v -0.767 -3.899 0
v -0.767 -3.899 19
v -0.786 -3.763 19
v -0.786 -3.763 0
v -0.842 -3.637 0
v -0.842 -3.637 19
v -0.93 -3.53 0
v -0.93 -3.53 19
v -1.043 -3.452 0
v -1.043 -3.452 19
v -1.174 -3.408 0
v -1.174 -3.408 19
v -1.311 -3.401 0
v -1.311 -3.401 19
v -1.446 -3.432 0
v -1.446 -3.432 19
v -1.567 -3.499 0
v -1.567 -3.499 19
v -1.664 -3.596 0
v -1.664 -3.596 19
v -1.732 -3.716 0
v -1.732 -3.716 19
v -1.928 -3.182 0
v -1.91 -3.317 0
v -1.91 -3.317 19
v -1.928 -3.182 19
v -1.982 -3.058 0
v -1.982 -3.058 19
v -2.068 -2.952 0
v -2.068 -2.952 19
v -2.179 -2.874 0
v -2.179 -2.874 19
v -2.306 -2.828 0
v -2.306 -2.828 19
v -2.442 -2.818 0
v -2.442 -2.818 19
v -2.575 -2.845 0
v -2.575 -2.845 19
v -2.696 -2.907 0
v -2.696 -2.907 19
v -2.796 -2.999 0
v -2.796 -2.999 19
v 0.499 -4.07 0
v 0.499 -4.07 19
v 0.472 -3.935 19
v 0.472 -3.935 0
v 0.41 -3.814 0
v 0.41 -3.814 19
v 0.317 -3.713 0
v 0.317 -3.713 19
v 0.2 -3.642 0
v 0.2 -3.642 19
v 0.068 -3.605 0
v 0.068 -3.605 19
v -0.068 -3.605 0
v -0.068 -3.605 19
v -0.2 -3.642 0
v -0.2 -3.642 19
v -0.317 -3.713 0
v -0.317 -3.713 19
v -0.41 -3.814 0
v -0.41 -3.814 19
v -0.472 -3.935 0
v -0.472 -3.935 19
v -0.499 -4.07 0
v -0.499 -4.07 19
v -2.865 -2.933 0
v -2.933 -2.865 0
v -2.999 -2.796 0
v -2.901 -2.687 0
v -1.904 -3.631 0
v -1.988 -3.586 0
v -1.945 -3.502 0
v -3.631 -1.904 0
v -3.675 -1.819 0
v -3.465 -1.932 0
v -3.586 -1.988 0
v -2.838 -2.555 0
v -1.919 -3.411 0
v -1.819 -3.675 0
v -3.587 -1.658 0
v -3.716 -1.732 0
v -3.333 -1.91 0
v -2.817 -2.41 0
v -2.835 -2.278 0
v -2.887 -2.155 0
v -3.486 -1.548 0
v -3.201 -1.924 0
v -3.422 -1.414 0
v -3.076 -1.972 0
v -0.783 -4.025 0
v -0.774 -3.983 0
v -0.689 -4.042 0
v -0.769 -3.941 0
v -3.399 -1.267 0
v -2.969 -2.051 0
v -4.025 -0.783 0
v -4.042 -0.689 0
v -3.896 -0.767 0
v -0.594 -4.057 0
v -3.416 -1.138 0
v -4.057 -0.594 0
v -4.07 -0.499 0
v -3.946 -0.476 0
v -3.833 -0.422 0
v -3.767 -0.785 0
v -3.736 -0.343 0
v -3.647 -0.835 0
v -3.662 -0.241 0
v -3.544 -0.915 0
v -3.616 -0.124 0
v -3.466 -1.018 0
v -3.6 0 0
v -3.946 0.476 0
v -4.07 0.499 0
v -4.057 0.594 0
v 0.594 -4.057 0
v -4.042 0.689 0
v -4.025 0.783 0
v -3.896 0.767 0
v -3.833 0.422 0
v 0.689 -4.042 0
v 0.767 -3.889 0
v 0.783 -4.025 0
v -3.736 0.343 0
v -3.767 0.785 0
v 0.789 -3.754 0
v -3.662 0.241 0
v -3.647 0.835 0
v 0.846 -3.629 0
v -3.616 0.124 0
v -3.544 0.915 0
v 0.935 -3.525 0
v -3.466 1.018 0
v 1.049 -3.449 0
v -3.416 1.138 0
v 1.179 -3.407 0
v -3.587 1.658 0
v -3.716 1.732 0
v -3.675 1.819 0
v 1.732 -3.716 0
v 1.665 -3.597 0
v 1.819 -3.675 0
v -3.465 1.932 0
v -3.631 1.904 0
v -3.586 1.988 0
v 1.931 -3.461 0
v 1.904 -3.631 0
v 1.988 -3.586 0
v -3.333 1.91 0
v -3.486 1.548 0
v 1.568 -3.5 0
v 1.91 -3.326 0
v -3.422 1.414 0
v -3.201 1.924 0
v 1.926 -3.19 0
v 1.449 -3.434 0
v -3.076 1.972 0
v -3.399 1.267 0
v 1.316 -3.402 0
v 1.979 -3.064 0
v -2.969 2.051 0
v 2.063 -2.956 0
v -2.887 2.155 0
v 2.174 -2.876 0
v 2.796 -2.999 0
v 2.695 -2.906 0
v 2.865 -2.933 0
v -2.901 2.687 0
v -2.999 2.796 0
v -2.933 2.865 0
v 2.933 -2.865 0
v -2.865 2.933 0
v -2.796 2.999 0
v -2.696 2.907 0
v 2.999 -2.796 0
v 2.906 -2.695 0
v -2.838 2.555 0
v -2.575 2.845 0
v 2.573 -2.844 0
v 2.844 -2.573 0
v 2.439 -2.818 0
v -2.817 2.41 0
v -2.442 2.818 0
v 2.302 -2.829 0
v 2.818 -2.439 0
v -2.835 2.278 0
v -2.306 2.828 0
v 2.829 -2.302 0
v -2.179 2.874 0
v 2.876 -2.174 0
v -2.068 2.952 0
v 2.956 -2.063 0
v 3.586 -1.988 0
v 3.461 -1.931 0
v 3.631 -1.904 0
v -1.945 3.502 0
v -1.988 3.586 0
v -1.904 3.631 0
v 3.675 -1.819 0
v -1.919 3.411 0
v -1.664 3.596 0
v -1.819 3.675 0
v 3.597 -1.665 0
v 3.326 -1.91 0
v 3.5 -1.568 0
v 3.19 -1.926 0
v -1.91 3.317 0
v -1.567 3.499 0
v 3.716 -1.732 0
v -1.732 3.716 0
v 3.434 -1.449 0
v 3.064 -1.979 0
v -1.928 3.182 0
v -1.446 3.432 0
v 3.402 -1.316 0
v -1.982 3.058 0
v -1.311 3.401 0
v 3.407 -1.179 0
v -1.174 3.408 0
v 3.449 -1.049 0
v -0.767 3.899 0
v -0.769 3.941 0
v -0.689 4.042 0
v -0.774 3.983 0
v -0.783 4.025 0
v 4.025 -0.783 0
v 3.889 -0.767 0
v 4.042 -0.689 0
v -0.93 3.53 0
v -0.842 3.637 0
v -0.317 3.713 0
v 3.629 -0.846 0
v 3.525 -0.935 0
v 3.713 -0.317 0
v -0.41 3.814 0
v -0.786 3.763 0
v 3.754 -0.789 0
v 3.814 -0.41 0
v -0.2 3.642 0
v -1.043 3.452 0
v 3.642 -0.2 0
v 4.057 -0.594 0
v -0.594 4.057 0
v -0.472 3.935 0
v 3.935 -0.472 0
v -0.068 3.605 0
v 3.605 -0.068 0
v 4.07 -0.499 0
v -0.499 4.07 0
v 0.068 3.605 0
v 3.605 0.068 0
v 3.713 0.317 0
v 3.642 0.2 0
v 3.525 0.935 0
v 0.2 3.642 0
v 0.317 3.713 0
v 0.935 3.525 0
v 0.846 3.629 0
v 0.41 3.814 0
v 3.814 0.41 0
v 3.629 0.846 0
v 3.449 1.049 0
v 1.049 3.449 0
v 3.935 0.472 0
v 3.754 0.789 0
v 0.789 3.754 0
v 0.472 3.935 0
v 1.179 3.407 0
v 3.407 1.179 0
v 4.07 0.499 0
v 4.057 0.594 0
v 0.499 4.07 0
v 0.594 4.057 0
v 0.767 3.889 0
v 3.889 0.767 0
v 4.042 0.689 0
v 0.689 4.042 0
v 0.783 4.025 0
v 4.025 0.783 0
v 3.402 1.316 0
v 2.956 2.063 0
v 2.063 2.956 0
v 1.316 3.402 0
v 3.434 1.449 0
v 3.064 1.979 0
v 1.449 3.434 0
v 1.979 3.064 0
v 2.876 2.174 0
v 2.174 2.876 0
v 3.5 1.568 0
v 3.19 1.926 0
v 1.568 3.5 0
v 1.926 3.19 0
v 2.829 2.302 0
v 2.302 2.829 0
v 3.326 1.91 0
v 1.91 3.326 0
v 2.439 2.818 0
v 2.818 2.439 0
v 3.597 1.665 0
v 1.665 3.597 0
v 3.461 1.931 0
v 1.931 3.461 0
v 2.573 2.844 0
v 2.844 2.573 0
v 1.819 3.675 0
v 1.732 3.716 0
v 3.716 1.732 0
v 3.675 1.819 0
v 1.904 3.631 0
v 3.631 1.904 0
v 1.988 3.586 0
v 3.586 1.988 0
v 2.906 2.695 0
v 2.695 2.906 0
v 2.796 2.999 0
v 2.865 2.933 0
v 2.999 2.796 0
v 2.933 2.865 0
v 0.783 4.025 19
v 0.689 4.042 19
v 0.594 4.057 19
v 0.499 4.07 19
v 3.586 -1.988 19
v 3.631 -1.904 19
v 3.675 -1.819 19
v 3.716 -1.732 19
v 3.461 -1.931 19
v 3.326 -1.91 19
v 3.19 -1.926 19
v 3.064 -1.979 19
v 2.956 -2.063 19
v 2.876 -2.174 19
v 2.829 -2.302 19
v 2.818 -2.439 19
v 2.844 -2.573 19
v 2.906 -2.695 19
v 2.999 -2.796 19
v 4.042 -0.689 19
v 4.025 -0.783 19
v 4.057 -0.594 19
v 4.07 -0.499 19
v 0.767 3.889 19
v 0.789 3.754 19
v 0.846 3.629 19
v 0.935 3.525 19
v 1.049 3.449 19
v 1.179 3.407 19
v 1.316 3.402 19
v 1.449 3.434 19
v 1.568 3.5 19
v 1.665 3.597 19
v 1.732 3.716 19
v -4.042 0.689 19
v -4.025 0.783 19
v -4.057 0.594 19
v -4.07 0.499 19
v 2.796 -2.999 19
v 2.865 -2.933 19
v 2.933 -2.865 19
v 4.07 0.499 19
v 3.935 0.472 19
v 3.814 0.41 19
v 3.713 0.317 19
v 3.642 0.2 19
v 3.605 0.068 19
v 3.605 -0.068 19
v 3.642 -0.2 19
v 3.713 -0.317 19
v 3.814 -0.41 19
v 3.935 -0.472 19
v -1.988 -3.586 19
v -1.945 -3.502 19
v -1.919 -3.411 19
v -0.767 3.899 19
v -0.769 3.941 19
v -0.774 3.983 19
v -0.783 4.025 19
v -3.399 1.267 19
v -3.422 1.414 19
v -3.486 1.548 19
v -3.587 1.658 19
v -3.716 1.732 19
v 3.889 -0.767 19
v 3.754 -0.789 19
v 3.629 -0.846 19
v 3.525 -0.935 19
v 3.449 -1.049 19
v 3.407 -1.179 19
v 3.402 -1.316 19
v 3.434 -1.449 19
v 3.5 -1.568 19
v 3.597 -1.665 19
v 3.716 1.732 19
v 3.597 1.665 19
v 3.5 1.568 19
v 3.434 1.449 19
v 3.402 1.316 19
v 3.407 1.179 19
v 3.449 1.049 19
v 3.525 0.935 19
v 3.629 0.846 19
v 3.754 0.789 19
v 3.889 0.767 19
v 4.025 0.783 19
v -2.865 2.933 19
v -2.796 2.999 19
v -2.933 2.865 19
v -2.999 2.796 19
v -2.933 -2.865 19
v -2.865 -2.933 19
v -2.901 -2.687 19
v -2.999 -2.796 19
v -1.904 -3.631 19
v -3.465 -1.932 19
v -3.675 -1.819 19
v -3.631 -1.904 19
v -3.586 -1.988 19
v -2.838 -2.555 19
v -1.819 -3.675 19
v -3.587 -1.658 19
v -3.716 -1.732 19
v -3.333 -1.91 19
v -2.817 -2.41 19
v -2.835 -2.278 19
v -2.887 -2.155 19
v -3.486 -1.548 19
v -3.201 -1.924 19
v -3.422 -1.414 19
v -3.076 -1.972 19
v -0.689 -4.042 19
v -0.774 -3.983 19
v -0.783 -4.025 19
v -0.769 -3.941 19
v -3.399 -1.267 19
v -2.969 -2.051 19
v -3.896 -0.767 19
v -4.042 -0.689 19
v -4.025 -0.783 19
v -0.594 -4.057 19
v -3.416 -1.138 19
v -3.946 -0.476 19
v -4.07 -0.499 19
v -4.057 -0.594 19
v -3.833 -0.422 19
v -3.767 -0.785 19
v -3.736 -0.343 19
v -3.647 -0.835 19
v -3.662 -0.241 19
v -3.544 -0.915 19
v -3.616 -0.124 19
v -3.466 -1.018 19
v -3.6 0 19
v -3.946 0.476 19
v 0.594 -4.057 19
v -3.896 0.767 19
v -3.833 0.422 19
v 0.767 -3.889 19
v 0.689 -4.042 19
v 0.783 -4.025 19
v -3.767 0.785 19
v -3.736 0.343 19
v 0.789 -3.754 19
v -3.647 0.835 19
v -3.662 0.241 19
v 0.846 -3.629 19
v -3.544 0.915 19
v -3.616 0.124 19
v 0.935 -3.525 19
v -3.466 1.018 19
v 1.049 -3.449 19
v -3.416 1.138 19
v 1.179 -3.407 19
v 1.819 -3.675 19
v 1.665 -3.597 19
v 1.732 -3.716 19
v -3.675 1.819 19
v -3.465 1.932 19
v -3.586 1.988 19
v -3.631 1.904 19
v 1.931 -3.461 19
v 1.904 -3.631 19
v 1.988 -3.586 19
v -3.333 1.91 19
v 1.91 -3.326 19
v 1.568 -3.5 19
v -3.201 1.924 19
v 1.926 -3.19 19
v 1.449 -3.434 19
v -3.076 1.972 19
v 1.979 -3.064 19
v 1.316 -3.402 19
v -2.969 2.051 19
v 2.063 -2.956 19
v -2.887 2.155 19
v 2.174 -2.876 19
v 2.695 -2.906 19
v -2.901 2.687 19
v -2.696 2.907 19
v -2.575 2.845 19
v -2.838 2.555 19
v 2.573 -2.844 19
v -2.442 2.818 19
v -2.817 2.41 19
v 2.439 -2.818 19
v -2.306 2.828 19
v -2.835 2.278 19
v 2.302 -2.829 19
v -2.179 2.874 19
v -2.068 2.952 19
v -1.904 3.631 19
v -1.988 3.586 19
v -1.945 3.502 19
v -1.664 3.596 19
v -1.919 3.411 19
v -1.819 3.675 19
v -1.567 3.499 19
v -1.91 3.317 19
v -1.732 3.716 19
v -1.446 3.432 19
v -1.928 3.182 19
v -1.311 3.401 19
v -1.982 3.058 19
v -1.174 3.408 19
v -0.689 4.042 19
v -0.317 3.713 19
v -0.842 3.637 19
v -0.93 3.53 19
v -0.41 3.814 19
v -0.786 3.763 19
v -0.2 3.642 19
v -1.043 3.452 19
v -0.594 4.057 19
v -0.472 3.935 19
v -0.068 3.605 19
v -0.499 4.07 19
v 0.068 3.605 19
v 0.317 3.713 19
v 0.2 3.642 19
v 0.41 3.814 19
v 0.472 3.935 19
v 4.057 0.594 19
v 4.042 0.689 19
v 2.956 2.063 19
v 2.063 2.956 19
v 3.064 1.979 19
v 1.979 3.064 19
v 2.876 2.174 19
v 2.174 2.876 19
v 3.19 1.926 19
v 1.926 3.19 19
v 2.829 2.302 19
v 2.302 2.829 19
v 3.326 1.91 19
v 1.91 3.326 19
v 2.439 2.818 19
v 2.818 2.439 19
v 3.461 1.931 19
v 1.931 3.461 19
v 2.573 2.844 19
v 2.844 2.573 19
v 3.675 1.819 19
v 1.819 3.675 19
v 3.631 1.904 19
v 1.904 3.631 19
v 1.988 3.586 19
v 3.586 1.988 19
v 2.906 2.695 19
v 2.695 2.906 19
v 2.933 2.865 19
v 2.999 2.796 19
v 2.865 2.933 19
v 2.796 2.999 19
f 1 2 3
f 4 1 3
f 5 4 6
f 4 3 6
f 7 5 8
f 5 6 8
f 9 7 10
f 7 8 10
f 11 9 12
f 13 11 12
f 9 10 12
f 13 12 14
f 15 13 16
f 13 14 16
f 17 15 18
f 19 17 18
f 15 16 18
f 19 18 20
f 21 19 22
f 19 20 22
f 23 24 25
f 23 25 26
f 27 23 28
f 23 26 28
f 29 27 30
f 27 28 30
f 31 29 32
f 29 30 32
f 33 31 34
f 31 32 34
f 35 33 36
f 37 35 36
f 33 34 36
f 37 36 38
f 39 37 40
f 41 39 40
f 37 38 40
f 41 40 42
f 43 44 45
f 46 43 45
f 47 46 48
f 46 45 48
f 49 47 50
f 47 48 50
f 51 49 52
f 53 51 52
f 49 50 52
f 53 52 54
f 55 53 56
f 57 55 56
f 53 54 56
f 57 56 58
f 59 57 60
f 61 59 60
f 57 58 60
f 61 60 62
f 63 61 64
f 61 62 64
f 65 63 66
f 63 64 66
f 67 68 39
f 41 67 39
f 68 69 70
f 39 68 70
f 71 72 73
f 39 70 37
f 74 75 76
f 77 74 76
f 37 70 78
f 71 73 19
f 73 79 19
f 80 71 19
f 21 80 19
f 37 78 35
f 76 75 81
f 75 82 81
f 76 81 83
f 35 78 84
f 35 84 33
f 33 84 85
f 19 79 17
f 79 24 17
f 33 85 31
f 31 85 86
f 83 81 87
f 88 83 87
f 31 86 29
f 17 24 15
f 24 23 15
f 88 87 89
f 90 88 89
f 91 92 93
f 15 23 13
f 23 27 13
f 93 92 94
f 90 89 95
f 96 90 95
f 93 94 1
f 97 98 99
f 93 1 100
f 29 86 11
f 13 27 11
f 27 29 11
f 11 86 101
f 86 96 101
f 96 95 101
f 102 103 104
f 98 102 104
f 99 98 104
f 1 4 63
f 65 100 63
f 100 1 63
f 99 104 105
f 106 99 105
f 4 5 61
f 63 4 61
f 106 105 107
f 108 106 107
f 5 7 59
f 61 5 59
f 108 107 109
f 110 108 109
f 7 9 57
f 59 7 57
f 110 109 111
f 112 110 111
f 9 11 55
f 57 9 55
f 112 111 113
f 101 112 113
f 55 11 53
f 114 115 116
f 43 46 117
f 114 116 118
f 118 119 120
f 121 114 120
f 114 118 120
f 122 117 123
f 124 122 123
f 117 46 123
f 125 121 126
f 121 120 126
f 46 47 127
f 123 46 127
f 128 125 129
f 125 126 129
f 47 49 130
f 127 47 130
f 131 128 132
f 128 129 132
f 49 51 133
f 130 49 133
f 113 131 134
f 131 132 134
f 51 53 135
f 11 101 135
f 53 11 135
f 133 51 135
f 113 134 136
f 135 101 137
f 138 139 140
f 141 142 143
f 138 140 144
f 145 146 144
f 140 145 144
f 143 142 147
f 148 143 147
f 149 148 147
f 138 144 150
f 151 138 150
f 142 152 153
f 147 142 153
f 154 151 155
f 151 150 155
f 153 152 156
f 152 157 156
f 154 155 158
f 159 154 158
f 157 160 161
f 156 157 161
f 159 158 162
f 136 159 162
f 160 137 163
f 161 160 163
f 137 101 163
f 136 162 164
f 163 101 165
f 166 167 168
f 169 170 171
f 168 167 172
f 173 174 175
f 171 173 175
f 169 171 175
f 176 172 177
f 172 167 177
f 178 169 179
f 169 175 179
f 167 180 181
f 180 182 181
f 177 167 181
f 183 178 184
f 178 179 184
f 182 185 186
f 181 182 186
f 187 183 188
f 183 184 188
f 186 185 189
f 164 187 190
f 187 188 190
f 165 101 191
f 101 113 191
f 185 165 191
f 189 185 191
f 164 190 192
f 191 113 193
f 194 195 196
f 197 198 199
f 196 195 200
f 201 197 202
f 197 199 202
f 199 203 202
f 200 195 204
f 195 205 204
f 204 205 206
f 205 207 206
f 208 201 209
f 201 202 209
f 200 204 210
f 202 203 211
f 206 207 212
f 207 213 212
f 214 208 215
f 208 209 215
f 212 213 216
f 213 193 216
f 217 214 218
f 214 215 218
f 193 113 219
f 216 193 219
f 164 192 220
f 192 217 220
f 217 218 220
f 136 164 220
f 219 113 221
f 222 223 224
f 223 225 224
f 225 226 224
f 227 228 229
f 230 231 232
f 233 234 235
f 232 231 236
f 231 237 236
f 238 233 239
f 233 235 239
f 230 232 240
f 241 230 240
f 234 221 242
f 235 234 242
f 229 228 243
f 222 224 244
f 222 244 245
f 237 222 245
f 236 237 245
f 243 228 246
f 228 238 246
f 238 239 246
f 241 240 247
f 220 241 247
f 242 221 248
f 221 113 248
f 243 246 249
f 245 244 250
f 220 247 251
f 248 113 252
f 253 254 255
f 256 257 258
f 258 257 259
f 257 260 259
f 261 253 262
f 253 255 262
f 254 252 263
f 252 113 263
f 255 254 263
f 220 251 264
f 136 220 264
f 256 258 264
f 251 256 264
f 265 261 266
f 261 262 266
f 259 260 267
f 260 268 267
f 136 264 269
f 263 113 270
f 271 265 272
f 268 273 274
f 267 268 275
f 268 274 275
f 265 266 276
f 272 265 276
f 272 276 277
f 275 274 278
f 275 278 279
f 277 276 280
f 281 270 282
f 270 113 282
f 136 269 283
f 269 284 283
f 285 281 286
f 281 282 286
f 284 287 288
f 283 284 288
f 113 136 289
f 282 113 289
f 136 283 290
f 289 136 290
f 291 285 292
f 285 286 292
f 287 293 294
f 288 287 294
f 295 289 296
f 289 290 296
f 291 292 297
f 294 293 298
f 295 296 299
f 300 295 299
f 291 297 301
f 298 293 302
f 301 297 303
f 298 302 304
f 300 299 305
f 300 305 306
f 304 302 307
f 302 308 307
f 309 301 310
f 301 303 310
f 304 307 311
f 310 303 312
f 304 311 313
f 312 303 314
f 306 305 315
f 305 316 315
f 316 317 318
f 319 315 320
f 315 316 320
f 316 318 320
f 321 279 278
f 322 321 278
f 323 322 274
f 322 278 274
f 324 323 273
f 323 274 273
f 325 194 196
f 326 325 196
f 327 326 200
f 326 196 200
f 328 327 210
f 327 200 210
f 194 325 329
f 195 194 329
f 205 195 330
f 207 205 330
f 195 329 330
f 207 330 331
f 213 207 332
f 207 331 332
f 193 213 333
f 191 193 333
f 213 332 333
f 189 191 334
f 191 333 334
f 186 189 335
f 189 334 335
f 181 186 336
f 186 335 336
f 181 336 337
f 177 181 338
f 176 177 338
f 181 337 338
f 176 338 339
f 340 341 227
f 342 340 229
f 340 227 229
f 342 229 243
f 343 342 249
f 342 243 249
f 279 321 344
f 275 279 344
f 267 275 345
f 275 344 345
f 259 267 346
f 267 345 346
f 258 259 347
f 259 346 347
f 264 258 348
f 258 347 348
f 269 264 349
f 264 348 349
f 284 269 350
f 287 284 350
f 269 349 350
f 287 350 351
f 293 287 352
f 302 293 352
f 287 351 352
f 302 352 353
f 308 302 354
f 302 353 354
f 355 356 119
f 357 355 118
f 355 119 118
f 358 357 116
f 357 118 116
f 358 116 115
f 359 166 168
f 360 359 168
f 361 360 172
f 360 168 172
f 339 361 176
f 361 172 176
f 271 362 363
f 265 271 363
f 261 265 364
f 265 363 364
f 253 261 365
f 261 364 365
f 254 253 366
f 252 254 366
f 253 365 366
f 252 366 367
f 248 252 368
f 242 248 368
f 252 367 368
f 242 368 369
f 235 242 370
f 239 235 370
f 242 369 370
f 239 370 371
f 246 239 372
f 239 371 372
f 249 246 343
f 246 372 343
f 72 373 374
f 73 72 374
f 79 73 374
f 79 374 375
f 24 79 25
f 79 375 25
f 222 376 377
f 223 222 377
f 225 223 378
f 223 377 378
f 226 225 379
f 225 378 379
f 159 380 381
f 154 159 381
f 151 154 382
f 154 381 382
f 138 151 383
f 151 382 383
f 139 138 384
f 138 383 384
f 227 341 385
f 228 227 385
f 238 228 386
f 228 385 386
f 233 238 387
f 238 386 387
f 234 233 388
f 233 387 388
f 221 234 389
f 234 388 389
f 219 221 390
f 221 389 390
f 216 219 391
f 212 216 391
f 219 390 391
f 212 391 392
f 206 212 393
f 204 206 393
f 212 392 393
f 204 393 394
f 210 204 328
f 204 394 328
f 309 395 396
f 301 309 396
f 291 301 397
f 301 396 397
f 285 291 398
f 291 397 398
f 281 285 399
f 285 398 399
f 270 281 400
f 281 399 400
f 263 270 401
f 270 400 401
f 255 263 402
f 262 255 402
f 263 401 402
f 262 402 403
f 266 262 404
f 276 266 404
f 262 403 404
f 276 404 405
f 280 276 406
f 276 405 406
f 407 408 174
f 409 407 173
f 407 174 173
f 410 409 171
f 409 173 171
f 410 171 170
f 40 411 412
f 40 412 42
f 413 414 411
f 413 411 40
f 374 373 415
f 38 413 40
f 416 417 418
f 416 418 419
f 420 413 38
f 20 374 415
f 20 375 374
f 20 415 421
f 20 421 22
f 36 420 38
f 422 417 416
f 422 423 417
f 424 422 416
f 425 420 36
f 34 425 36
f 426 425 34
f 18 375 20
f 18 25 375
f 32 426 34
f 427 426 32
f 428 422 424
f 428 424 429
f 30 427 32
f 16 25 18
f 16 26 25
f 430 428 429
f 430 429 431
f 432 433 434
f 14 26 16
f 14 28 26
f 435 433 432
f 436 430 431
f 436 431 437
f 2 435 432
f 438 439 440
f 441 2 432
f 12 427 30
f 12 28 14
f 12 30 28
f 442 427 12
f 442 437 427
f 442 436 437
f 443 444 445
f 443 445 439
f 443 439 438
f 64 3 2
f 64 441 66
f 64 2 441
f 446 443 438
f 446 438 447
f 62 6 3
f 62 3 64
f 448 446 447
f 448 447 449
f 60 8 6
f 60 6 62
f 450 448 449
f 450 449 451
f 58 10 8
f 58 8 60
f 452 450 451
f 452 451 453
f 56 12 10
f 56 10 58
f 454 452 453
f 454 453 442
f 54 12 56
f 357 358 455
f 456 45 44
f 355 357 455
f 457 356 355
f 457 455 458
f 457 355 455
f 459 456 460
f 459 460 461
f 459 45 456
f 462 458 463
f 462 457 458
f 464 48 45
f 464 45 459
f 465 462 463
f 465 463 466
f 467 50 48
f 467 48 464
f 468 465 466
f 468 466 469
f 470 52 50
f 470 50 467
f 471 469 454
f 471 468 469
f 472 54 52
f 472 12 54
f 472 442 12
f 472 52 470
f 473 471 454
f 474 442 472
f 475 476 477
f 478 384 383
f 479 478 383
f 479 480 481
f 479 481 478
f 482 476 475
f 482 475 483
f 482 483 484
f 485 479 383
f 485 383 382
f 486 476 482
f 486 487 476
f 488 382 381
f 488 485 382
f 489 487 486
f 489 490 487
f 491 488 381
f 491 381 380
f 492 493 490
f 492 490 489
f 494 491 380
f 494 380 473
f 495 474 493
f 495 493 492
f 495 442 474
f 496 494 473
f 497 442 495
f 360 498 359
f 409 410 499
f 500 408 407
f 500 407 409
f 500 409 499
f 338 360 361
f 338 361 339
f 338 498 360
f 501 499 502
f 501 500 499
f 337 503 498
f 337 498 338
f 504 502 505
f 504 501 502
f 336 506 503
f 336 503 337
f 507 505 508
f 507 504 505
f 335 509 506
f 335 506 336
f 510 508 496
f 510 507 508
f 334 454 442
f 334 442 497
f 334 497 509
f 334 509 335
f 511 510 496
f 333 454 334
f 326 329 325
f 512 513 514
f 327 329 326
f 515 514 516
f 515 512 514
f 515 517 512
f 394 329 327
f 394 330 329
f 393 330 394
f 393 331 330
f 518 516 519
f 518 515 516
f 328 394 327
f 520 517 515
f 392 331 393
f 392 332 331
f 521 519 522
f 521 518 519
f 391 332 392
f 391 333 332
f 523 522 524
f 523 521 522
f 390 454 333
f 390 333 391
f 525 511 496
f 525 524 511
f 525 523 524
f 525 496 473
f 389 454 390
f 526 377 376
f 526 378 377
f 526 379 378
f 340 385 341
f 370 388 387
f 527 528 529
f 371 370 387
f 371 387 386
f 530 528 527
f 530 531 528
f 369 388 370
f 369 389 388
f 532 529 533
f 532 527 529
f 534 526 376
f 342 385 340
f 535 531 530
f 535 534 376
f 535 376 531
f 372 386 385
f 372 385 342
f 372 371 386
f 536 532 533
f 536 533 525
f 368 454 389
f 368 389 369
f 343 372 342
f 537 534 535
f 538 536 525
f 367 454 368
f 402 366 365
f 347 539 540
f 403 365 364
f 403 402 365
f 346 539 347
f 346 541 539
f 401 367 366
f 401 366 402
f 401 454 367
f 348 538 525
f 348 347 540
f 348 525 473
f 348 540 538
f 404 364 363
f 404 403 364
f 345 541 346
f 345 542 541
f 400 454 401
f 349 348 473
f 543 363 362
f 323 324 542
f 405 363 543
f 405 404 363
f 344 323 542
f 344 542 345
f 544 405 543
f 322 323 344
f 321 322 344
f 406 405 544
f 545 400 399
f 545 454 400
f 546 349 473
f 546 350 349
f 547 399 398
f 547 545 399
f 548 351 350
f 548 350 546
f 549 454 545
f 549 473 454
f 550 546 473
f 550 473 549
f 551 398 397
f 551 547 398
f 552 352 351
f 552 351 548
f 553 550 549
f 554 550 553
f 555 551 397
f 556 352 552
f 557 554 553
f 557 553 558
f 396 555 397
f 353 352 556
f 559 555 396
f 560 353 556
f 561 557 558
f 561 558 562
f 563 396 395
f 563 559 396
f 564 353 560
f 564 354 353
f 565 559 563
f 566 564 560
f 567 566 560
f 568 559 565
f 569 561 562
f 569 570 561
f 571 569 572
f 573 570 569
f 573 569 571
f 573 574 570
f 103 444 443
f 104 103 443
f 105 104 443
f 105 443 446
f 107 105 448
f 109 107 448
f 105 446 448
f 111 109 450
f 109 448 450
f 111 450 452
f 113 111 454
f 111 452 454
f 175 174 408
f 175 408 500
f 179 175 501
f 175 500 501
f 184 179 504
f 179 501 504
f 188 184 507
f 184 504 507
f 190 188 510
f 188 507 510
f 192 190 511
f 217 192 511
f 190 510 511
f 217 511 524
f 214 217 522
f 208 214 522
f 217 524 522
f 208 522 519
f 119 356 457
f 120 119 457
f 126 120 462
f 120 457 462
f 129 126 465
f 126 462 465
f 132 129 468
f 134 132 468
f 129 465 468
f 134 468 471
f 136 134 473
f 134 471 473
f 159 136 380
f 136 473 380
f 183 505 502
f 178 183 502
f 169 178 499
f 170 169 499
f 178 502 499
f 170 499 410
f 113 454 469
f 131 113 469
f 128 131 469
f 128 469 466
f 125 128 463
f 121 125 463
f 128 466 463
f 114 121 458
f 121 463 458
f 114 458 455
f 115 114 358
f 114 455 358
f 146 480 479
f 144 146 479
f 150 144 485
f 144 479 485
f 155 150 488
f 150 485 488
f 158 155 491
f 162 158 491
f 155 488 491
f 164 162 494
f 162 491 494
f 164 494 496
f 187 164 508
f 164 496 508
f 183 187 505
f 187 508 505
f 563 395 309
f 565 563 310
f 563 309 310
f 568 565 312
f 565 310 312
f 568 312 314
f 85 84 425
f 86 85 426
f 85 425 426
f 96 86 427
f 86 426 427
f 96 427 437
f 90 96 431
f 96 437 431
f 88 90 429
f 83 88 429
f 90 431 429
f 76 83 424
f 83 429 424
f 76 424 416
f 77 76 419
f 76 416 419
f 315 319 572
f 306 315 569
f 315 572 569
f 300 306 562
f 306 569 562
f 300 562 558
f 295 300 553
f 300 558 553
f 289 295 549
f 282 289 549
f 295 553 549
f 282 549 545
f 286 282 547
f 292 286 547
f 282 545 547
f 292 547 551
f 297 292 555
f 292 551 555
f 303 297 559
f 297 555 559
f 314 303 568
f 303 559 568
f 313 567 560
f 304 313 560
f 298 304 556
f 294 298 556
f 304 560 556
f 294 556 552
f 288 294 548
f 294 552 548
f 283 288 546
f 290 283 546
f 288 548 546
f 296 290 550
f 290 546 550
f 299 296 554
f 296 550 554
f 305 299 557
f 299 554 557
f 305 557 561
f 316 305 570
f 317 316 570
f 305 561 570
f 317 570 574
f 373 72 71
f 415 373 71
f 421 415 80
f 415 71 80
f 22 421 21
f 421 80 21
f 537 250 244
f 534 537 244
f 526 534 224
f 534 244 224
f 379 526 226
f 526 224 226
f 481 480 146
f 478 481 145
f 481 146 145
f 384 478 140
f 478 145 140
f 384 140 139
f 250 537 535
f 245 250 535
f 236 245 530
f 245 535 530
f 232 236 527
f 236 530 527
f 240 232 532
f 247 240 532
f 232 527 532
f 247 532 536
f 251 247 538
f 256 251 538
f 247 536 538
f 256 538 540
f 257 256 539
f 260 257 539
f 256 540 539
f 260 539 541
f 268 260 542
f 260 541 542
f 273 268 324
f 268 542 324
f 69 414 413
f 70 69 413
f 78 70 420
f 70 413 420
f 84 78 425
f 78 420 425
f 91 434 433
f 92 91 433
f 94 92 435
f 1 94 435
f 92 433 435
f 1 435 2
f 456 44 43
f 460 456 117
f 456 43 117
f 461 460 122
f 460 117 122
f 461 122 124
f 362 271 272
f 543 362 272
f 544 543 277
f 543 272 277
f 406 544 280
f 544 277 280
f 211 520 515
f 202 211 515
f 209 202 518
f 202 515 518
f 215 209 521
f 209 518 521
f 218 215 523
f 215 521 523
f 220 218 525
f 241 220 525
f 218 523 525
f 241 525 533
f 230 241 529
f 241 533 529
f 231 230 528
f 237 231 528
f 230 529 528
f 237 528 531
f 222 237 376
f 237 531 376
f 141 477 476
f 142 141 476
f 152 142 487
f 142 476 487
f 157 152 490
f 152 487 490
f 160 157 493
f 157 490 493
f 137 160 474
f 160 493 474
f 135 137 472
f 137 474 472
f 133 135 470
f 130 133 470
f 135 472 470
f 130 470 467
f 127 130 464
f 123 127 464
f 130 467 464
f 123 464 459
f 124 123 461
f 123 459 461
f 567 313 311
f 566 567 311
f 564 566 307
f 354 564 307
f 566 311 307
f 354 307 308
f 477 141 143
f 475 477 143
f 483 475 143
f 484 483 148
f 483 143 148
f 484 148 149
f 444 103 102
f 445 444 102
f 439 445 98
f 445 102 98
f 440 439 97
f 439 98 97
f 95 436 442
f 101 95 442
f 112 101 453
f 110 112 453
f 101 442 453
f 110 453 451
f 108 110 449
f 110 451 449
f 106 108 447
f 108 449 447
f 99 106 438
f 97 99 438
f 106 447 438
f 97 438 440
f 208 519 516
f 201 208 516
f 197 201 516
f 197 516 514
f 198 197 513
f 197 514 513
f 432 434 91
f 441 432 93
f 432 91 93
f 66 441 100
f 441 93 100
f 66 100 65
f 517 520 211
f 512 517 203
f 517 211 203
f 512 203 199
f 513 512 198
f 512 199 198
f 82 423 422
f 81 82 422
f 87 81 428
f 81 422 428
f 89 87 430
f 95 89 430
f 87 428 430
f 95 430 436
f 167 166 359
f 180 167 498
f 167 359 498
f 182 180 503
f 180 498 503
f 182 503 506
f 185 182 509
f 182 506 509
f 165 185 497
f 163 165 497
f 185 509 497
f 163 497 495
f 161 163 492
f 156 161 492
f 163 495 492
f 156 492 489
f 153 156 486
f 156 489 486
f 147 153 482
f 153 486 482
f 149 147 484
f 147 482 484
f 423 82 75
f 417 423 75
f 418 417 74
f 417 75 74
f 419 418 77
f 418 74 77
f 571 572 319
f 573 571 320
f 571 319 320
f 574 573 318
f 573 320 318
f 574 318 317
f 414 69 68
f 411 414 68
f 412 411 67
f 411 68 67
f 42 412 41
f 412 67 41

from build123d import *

# Parameters (mm, degrees)
F0_R     = 4.1
F0_R_2   = 3
F1_DEPTH = 19
F3_DEPTH = 25


with BuildPart() as f1:
    # F0 (on Top) → F1 (new body)
    with BuildSketch(Plane.XY):
        Circle(F0_R)
        Circle(F0_R_2, mode=Mode.SUBTRACT)
        Circle(F0_R_2)
    extrude(amount=F1_DEPTH)

    # F2 (on face) → F3 (cut)
    with BuildSketch(Plane.XY.offset(19)):
        with BuildLine():
            ThreePointArc((0.4990696282, 4.0695121951), (0.4997673529, 4.0847490014), (0.5, 4.1))
            ThreePointArc((0.5, 4.1), (-0.0152509986, 4.5997673529), (-0.4990696282, 4.0695121951))
            ThreePointArc((-0.4990696282, 4.0695121951), (0, 4.1), (0.4990696282, 4.0695121951))
        make_face()
        with BuildLine():
            ThreePointArc((0.4990696282, 4.0695121951), (0, 4.1), (-0.4990696282, 4.0695121951))
            ThreePointArc((-0.4990696282, 4.0695121951), (0, 3.6), (0.4990696282, 4.0695121951))
        make_face()
        with BuildLine():
            ThreePointArc((-1.7321918491, 3.7161150948), (-1.2669696769, 3.8993317168), (-0.7829050052, 4.0245570878))
            ThreePointArc((-0.7829050052, 4.0245570878), (-1.4214781741, 4.374859975), (-1.7321918491, 3.7161150948))
        make_face()
        with BuildLine():
            ThreePointArc((-0.7669696769, 3.8993317168), (-0.7709695076, 3.9624493218), (-0.7829050052, 4.0245570878))
            ThreePointArc((-0.7829050052, 4.0245570878), (-1.2669696769, 3.8993317168), (-1.7321918491, 3.7161150948))
            ThreePointArc((-1.7321918491, 3.7161150948), (-1.1737256049, 3.4081031111), (-0.7669696769, 3.8993317168))
        make_face()
        with BuildLine():
            ThreePointArc((1.7321918491, 3.7161150948), (1.2669696769, 3.8993317168), (0.7829050052, 4.0245570878))
            ThreePointArc((0.7829050052, 4.0245570878), (1.1124611797, 3.4238034587), (1.7321918491, 3.7161150948))
        make_face()
        with BuildLine():
            ThreePointArc((-2.7957550629, 2.9989587574), (-2.4099195344, 3.3169696769), (-1.9882434418, 3.585650292))
            ThreePointArc((-1.9882434418, 3.585650292), (-2.7038121605, 3.7214781741), (-2.7957550629, 2.9989587574))
        make_face()
        with BuildLine():
            ThreePointArc((-1.9099195344, 3.3169696769), (-1.929899719, 3.4569017206), (-1.9882434418, 3.585650292))
            ThreePointArc((-1.9882434418, 3.585650292), (-2.4099195344, 3.3169696769), (-2.7957550629, 2.9989587574))
            ThreePointArc((-2.7957550629, 2.9989587574), (-2.2409783675, 2.8463754971), (-1.9099195344, 3.3169696769))
        make_face()
        with BuildLine():
            ThreePointArc((2.7957550629, 2.9989587574), (2.4099195344, 3.3169696769), (1.9882434418, 3.585650292))
            ThreePointArc((1.9882434418, 3.585650292), (2.1160269083, 2.9124611797), (2.7957550629, 2.9989587574))
        make_face()
        with BuildLine():
            ThreePointArc((-3.585650292, 1.9882434418), (-3.3169696769, 2.4099195344), (-2.9989587574, 2.7957550629))
            ThreePointArc((-2.9989587574, 2.7957550629), (-3.7214781741, 2.7038121605), (-3.585650292, 1.9882434418))
        make_face()
        with BuildLine():
            ThreePointArc((-2.8169696769, 2.4099195344), (-2.8647498964, 2.6232204254), (-2.9989587574, 2.7957550629))
            ThreePointArc((-2.9989587574, 2.7957550629), (-3.3169696769, 2.4099195344), (-3.585650292, 1.9882434418))
            ThreePointArc((-3.585650292, 1.9882434418), (-3.0764913073, 1.9715473709), (-2.8169696769, 2.4099195344))
        make_face()
        with BuildLine():
            ThreePointArc((3.585650292, 1.9882434418), (3.3169696769, 2.4099195344), (2.9989587574, 2.7957550629))
            ThreePointArc((2.9989587574, 2.7957550629), (2.9124611797, 2.1160269083), (3.585650292, 1.9882434418))
        make_face()
        with BuildLine():
            ThreePointArc((-4.0245570878, 0.7829050052), (-3.8993317168, 1.2669696769), (-3.7161150948, 1.7321918491))
            ThreePointArc((-3.7161150948, 1.7321918491), (-4.374859975, 1.4214781741), (-4.0245570878, 0.7829050052))
        make_face()
        with BuildLine():
            ThreePointArc((-3.3993317168, 1.2669696769), (-3.486047123, 1.5483872395), (-3.7161150948, 1.7321918491))
            ThreePointArc((-3.7161150948, 1.7321918491), (-3.8993317168, 1.2669696769), (-4.0245570878, 0.7829050052))
            ThreePointArc((-4.0245570878, 0.7829050052), (-3.5932375201, 0.8716137073), (-3.3993317168, 1.2669696769))
        make_face()
        with BuildLine():
            ThreePointArc((4.0245570878, 0.7829050052), (3.8993317168, 1.2669696769), (3.7161150948, 1.7321918491))
            ThreePointArc((3.7161150948, 1.7321918491), (3.4238034587, 1.1124611797), (4.0245570878, 0.7829050052))
        make_face()
        with BuildLine():
            ThreePointArc((-4.0695121951, -0.4990696282), (-4.1, 0), (-4.0695121951, 0.4990696282))
            ThreePointArc((-4.0695121951, 0.4990696282), (-4.6, 0), (-4.0695121951, -0.4990696282))
        make_face()
        with BuildLine():
            ThreePointArc((-3.6, 0), (-3.7358270312, 0.3426047997), (-4.0695121951, 0.4990696282))
            ThreePointArc((-4.0695121951, 0.4990696282), (-4.1, 0), (-4.0695121951, -0.4990696282))
            ThreePointArc((-4.0695121951, -0.4990696282), (-3.7358270312, -0.3426047997), (-3.6, 0))
        make_face()
        with BuildLine():
            ThreePointArc((4.1, 0), (4.0923709509, 0.25), (4.0695121951, 0.4990696282))
            ThreePointArc((4.0695121951, 0.4990696282), (3.6, 0), (4.0695121951, -0.4990696282))
            ThreePointArc((4.0695121951, -0.4990696282), (4.0923709509, -0.25), (4.1, 0))
        make_face()
        with BuildLine():
            ThreePointArc((4.6, 0), (4.4426047997, 0.3641729688), (4.0695121951, 0.4990696282))
            ThreePointArc((4.0695121951, 0.4990696282), (4.0923709509, 0.25), (4.1, 0))
            ThreePointArc((4.1, 0), (4.0923709509, -0.25), (4.0695121951, -0.4990696282))
            ThreePointArc((4.0695121951, -0.4990696282), (4.4426047997, -0.3641729688), (4.6, 0))
        make_face()
        with BuildLine():
            ThreePointArc((-3.7161150948, -1.7321918491), (-3.8993317168, -1.2669696769), (-4.0245570878, -0.7829050052))
            ThreePointArc((-4.0245570878, -0.7829050052), (-4.374859975, -1.4214781741), (-3.7161150948, -1.7321918491))
        make_face()
        with BuildLine():
            ThreePointArc((-3.3993317168, -1.2669696769), (-3.5932375201, -0.8716137073), (-4.0245570878, -0.7829050052))
            ThreePointArc((-4.0245570878, -0.7829050052), (-3.8993317168, -1.2669696769), (-3.7161150948, -1.7321918491))
            ThreePointArc((-3.7161150948, -1.7321918491), (-3.486047123, -1.5483872395), (-3.3993317168, -1.2669696769))
        make_face()
        with BuildLine():
            ThreePointArc((3.7161150948, -1.7321918491), (3.8993317168, -1.2669696769), (4.0245570878, -0.7829050052))
            ThreePointArc((4.0245570878, -0.7829050052), (3.4238034587, -1.1124611797), (3.7161150948, -1.7321918491))
        make_face()
        with BuildLine():
            ThreePointArc((-2.8169696769, -2.4099195344), (-3.0764913073, -1.9715473709), (-3.585650292, -1.9882434418))
            ThreePointArc((-3.585650292, -1.9882434418), (-3.3169696769, -2.4099195344), (-2.9989587574, -2.7957550629))
            ThreePointArc((-2.9989587574, -2.7957550629), (-2.8647498964, -2.6232204254), (-2.8169696769, -2.4099195344))
        make_face()
        with BuildLine():
            ThreePointArc((2.9989587574, -2.7957550629), (3.3169696769, -2.4099195344), (3.585650292, -1.9882434418))
            ThreePointArc((3.585650292, -1.9882434418), (2.9124611797, -2.1160269083), (2.9989587574, -2.7957550629))
        make_face()
        with BuildLine():
            ThreePointArc((-1.9099195344, -3.3169696769), (-2.2409783675, -2.8463754971), (-2.7957550629, -2.9989587574))
            ThreePointArc((-2.7957550629, -2.9989587574), (-2.4099195344, -3.3169696769), (-1.9882434418, -3.585650292))
            ThreePointArc((-1.9882434418, -3.585650292), (-1.929899719, -3.4569017206), (-1.9099195344, -3.3169696769))
        make_face()
        with BuildLine():
            ThreePointArc((1.9882434418, -3.585650292), (2.4099195344, -3.3169696769), (2.7957550629, -2.9989587574))
            ThreePointArc((2.7957550629, -2.9989587574), (2.1160269083, -2.9124611797), (1.9882434418, -3.585650292))
        make_face()
        with BuildLine():
            ThreePointArc((-0.7669696769, -3.8993317168), (-1.1737256049, -3.4081031111), (-1.7321918491, -3.7161150948))
            ThreePointArc((-1.7321918491, -3.7161150948), (-1.2669696769, -3.8993317168), (-0.7829050052, -4.0245570878))
            ThreePointArc((-0.7829050052, -4.0245570878), (-0.7709695076, -3.9624493218), (-0.7669696769, -3.8993317168))
        make_face()
        with BuildLine():
            ThreePointArc((0.7829050052, -4.0245570878), (1.2669696769, -3.8993317168), (1.7321918491, -3.7161150948))
            ThreePointArc((1.7321918491, -3.7161150948), (1.1124611797, -3.4238034587), (0.7829050052, -4.0245570878))
        make_face()
        with BuildLine():
            ThreePointArc((0.4990696282, -4.0695121951), (0, -3.6), (-0.4990696282, -4.0695121951))
            ThreePointArc((-0.4990696282, -4.0695121951), (0, -4.1), (0.4990696282, -4.0695121951))
        make_face()
    extrude(amount=-F3_DEPTH, mode=Mode.SUBTRACT)


solid = f1.part
